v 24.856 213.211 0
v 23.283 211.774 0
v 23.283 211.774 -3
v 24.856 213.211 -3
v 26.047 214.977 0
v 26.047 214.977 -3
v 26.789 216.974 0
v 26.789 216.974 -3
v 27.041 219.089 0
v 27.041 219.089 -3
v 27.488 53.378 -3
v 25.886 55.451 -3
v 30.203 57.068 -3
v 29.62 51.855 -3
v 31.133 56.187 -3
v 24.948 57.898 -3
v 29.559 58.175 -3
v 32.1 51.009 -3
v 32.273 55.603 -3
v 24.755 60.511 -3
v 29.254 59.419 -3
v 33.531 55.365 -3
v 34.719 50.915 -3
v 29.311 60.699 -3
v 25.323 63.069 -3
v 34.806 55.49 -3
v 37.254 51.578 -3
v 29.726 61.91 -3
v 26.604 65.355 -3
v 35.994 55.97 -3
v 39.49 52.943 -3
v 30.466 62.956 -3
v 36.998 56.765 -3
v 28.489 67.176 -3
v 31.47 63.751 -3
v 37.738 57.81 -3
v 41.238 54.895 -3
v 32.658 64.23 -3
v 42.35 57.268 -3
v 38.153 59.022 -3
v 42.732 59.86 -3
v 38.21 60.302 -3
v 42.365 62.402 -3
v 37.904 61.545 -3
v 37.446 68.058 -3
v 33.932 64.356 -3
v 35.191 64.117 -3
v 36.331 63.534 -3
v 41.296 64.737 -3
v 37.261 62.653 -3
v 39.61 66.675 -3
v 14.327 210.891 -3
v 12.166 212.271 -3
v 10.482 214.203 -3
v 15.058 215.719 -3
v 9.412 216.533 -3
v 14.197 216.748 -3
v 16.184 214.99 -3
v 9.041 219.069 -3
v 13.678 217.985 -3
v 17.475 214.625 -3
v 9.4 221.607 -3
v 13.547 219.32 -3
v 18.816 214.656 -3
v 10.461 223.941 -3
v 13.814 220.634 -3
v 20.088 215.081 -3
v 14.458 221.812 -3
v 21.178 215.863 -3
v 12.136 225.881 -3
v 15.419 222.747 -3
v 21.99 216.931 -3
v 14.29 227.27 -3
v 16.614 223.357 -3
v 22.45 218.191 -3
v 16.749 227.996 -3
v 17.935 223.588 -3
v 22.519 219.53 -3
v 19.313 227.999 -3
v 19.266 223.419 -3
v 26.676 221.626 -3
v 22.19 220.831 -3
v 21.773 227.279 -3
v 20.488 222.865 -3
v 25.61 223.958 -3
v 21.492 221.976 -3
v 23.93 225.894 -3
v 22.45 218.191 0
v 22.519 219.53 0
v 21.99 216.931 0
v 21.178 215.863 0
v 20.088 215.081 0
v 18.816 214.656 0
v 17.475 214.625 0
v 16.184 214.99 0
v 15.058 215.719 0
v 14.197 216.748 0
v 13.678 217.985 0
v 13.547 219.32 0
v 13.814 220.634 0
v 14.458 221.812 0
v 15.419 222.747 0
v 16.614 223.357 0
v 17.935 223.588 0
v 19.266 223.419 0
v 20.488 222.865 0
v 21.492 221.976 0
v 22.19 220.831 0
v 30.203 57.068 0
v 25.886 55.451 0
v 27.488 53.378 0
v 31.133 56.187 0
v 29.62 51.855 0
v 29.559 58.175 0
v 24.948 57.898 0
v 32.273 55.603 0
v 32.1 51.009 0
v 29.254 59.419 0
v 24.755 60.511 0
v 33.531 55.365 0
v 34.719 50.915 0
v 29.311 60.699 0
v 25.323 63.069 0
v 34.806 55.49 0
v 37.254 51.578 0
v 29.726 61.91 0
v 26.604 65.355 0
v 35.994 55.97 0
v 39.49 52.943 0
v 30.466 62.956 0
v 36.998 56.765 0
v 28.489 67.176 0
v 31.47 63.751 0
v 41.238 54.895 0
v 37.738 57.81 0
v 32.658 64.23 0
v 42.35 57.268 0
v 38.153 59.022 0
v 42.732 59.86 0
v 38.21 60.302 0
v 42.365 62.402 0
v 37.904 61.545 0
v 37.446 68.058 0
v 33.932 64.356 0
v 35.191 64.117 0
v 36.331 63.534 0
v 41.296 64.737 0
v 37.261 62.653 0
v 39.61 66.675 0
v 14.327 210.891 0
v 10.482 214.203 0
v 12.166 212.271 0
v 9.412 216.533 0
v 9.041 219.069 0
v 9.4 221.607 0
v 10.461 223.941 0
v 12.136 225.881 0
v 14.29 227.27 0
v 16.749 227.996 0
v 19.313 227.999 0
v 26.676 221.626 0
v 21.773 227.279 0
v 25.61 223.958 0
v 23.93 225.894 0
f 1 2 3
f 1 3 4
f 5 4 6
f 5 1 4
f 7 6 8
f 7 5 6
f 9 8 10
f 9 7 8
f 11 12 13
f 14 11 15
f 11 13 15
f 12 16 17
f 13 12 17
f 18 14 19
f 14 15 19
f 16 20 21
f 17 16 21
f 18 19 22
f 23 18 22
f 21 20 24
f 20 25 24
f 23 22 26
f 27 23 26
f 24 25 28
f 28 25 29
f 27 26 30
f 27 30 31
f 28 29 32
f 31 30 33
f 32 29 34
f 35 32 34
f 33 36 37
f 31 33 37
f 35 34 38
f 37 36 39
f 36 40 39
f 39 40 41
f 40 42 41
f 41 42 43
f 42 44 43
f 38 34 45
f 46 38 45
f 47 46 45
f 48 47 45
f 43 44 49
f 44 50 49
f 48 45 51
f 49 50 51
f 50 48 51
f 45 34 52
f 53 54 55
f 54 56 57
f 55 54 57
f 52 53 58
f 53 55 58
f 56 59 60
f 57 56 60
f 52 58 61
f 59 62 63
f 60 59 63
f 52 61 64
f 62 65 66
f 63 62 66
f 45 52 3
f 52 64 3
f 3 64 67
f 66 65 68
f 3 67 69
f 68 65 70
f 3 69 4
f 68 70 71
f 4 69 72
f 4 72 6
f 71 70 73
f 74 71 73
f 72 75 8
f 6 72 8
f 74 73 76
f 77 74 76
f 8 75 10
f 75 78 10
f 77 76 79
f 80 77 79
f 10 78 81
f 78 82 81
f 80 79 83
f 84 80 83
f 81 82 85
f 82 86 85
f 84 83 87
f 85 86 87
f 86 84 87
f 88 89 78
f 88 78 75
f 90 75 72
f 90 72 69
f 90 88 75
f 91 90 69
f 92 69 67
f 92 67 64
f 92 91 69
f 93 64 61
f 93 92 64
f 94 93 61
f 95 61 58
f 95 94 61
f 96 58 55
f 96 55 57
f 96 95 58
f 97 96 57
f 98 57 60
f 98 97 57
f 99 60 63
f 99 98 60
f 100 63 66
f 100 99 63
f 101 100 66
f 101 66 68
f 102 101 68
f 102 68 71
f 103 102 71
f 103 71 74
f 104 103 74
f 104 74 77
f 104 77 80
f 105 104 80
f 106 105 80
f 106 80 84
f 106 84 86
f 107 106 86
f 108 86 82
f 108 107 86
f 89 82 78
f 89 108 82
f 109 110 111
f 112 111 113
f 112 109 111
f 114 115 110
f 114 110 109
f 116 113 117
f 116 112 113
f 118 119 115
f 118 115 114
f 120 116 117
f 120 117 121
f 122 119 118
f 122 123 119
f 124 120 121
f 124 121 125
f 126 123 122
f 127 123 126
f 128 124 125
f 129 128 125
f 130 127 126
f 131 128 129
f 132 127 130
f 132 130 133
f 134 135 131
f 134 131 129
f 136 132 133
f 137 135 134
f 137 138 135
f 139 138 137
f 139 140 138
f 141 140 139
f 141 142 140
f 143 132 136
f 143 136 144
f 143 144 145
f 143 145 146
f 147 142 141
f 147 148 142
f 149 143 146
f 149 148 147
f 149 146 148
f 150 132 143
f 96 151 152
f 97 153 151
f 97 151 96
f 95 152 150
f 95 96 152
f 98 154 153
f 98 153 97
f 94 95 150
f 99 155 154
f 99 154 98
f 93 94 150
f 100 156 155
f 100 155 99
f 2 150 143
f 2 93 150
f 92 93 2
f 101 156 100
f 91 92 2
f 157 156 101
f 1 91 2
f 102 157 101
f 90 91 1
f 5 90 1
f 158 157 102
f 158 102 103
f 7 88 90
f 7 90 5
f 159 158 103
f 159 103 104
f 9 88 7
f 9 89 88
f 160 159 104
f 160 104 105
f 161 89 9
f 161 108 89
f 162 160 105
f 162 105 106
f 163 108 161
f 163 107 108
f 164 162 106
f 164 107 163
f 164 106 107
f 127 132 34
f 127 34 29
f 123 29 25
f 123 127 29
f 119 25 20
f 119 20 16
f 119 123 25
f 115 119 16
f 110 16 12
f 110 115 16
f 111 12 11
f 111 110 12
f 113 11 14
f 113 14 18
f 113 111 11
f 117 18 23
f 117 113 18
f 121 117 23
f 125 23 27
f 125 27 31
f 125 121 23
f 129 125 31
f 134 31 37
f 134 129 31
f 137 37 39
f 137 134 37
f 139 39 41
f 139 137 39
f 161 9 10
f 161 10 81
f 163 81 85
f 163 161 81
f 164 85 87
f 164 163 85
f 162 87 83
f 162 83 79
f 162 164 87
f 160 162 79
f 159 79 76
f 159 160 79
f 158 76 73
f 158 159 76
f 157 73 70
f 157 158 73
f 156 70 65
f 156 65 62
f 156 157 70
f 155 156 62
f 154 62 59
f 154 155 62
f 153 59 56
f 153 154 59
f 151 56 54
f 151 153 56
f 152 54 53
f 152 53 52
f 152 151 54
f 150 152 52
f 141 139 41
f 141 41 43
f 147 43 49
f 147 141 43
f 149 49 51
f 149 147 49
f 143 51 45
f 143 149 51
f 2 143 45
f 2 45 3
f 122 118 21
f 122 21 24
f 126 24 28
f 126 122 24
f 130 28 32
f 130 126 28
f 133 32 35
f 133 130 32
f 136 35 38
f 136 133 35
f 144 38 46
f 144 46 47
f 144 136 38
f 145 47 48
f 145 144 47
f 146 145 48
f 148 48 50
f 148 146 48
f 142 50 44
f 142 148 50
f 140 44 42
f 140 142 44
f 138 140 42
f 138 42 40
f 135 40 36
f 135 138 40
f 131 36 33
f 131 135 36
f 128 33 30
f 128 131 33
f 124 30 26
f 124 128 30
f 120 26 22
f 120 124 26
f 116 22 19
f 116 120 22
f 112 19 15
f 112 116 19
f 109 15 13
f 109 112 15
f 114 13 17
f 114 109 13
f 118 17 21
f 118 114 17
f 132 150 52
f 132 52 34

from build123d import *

# Parameters (mm, degrees)
BOSS_EXTRUDE1_DEPTH = 3


with BuildPart() as part:
    # Sketch1 → Boss-Extrude1 (new body)
    with BuildSketch(Plane.XY):
        with BuildLine():
            ThreePointArc((27.040784053, 219.089006289), (13.163562513, 226.652914674), (14.326848487, 210.891038089))
            Line((14.326848487, 210.891038089), (13.562475801, 218.647695514))
            ThreePointArc((13.562475801, 218.647695514), (17.599473278, 223.567314541), (22.519092305, 219.530317065))
            Line((22.519092305, 219.530317065), (23.28346499, 211.773659641))
            ThreePointArc((23.28346499, 211.773659641), (26.046535999, 214.977080246), (27.040784053, 219.089006289))
        make_face()
        with BuildLine():
            Line((13.562475801, 218.647695514), (14.326848487, 210.891038089))
            ThreePointArc((14.326848487, 210.891038089), (18.923405604, 210.132389785), (23.28346499, 211.773659641))
            Line((23.28346499, 211.773659641), (22.519092305, 219.530317065))
            ThreePointArc((22.519092305, 219.530317065), (18.482094829, 214.610698037), (13.562475801, 218.647695514))
        make_face()
        with BuildLine():
            Line((14.326848487, 210.891038089), (28.489152913, 67.175615091))
            ThreePointArc((28.489152913, 67.175615091), (32.849212299, 68.816884946), (37.445769417, 68.058236642))
            Line((37.445769417, 68.058236642), (23.28346499, 211.773659641))
            ThreePointArc((23.28346499, 211.773659641), (18.923405604, 210.132389785), (14.326848487, 210.891038089))
        make_face()
        with BuildLine():
            ThreePointArc((38.210142102, 60.301579218), (34.173144626, 55.381960191), (29.253525599, 59.418957667))
            Line((29.253525599, 59.418957667), (28.489152913, 67.175615091))
            ThreePointArc((28.489152913, 67.175615091), (29.619907807, 51.854516497), (42.73183385, 59.860268443))
            ThreePointArc((42.73183385, 59.860268443), (41.295742235, 64.737489982), (37.445769417, 68.058236642))
            Line((37.445769417, 68.058236642), (38.210142102, 60.301579218))
        make_face()
        with BuildLine():
            Line((28.489152913, 67.175615091), (29.253525599, 59.418957667))
            ThreePointArc((29.253525599, 59.418957667), (33.290523075, 64.338576695), (38.210142102, 60.301579218))
            Line((38.210142102, 60.301579218), (37.445769417, 68.058236642))
            ThreePointArc((37.445769417, 68.058236642), (32.849212299, 68.816884946), (28.489152913, 67.175615091))
        make_face()
    extrude(amount=-BOSS_EXTRUDE1_DEPTH)


solid = part.part
